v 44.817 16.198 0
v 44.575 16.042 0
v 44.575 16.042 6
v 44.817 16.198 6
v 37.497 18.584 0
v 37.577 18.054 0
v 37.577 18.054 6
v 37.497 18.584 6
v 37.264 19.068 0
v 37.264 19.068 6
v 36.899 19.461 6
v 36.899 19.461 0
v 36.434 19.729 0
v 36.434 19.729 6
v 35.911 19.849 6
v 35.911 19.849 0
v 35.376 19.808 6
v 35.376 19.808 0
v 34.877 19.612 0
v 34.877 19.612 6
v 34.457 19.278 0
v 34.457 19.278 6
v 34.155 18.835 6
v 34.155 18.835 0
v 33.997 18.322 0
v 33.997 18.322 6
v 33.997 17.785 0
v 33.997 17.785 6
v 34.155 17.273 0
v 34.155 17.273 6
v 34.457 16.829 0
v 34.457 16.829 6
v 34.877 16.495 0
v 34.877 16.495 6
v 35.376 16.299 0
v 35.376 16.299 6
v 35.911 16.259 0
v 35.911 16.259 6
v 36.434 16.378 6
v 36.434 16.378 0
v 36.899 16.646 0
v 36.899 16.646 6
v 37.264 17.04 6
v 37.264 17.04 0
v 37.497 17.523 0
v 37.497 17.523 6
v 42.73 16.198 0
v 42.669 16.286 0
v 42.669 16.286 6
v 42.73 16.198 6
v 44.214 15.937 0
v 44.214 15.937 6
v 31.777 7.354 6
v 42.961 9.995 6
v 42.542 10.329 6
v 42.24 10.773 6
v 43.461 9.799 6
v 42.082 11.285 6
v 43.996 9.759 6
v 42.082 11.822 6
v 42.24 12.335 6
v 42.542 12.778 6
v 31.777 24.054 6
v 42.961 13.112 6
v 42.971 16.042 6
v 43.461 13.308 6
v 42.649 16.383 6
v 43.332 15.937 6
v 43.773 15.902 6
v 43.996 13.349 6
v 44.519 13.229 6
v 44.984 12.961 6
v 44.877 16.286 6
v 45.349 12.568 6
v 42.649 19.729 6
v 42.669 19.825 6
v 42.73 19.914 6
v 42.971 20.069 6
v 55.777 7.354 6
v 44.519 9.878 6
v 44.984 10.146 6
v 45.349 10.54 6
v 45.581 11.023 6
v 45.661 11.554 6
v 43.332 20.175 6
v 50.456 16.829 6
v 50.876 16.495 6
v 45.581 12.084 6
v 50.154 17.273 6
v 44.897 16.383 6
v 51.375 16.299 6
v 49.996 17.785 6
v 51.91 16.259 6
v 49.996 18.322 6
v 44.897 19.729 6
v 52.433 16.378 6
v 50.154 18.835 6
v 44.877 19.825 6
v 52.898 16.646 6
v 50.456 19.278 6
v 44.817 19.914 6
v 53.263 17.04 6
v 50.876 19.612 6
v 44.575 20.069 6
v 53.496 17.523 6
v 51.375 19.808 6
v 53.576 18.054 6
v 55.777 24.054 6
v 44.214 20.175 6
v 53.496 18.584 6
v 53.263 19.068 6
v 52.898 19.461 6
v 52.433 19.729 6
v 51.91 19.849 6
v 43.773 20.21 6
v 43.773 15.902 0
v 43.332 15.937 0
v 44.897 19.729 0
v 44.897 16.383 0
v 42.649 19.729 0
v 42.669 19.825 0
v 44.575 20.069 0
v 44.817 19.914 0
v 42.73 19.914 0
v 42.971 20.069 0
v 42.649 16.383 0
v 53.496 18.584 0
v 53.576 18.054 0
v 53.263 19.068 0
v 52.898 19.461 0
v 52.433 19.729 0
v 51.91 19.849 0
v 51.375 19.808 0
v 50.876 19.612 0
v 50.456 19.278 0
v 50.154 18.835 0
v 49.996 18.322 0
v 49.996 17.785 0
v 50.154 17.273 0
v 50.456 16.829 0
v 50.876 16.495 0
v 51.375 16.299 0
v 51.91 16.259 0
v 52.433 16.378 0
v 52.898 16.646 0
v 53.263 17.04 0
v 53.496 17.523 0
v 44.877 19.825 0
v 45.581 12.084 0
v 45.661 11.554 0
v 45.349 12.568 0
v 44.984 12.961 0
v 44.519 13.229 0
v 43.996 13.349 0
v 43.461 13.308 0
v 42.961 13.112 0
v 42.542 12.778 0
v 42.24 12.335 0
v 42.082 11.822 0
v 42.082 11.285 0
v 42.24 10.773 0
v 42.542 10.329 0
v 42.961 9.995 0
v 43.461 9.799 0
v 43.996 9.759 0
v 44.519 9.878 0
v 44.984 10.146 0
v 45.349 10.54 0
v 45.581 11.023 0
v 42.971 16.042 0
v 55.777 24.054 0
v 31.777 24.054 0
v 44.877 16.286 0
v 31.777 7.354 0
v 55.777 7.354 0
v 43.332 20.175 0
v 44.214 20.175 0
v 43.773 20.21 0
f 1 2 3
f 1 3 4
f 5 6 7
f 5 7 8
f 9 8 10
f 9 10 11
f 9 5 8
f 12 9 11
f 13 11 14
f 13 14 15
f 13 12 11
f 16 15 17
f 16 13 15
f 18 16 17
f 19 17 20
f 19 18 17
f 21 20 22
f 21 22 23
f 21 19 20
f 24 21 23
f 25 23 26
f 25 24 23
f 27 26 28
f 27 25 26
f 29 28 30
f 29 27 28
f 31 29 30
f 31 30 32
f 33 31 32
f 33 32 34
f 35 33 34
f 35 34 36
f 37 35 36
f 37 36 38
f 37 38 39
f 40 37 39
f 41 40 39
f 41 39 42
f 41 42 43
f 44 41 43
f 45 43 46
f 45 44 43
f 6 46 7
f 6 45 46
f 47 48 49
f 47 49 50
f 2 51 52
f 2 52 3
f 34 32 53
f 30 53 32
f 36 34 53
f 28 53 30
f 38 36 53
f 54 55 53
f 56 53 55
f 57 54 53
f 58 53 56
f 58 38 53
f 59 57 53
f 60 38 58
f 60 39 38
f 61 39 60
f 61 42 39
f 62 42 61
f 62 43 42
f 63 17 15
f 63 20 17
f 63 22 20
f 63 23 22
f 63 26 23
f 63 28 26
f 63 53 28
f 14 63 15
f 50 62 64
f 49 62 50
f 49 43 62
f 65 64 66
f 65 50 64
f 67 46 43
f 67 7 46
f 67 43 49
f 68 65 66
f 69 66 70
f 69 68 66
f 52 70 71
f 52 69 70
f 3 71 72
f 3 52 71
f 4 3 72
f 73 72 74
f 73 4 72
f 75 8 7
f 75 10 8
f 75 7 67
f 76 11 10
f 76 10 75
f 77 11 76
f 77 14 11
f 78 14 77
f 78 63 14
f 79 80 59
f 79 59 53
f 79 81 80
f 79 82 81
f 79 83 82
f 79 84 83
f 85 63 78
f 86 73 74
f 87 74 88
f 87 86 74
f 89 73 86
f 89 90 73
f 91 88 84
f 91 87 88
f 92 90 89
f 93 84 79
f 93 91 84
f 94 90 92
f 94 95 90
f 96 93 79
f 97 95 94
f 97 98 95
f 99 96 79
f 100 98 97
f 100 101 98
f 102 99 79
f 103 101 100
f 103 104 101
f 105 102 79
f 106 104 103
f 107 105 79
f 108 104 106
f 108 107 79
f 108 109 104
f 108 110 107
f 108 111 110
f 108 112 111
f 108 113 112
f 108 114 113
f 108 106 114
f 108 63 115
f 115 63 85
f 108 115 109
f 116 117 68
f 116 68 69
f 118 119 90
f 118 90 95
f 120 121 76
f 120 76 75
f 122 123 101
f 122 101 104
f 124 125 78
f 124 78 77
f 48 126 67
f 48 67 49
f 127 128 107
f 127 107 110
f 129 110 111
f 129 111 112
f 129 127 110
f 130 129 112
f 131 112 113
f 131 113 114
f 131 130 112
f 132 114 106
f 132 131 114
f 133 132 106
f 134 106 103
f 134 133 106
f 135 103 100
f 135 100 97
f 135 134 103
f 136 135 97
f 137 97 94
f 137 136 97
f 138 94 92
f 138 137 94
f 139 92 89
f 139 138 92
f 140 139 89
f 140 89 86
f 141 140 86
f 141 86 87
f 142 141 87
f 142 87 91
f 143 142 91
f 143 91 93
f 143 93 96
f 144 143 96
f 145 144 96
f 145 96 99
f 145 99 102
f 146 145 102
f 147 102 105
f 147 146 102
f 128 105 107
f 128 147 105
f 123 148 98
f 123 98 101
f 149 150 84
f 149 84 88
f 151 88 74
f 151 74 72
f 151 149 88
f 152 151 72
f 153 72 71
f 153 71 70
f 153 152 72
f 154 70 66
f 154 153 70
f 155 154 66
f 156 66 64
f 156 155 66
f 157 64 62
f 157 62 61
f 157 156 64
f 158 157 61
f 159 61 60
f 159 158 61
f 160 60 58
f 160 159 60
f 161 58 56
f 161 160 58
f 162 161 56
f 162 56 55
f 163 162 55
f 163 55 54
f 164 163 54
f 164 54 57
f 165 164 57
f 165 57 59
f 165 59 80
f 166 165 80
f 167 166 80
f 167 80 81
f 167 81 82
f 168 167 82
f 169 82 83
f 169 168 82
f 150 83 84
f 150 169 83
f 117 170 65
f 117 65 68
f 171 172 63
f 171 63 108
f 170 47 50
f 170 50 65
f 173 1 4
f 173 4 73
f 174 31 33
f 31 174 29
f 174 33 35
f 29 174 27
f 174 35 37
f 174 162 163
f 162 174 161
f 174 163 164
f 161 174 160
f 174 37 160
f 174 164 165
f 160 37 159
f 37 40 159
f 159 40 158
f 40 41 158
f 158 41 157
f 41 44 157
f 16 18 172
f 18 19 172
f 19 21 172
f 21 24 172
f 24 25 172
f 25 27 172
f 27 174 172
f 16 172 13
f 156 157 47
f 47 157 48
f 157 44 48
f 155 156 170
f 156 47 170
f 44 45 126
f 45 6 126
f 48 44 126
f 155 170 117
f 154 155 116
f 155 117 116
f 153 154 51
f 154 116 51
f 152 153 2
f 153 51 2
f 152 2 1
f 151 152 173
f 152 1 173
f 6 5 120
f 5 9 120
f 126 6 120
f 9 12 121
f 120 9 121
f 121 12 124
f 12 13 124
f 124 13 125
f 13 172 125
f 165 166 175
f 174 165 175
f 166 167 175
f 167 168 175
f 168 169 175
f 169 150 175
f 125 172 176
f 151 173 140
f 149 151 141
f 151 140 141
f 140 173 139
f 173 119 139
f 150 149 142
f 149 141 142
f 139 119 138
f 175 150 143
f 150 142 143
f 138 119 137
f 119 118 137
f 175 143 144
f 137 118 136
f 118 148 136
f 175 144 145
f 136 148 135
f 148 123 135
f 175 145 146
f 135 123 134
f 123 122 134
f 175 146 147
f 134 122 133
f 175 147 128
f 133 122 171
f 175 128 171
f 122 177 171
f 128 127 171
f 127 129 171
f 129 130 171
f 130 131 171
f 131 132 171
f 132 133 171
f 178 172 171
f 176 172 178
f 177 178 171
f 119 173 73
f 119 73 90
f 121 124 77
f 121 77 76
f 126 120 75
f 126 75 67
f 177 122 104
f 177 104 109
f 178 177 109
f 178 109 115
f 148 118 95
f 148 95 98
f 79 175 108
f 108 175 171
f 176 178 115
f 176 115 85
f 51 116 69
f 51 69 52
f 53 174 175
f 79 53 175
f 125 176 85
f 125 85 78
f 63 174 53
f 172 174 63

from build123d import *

# Parameters (mm, degrees)
MODEL_W                  = 23.99999232
MODEL_H                  = 16.699994656
MODEL_R                  = 1.8
RESSALTO_EXTRUS_O1_DEPTH = 6


with BuildPart() as part:
    # Model → Ressalto-extrusão1 (new body)
    with BuildSketch(Plane.XY):
        with Locations((43.7766695, 15.703554206)):
            Rectangle(MODEL_W, MODEL_H)
        with Locations((35.77667206, 18.053553454)):
            Circle(MODEL_R, mode=Mode.SUBTRACT)
        with Locations((43.861433665, 11.553555534)):
            Circle(MODEL_R, mode=Mode.SUBTRACT)
        with Locations((51.77555053, 18.053553454)):
            Circle(MODEL_R, mode=Mode.SUBTRACT)
        Polygon((42.649145536, 19.728924359), (42.649145536, 16.382506676), (42.669242478, 16.286318247), (42.729533303, 16.197543356), (42.970696603, 16.042234191), (43.332060456, 15.936872625), (43.77304988, 15.901752102), (44.214039305, 15.936872625), (44.575403158, 16.042234191), (44.816566458, 16.197543356), (44.876857283, 16.286318247), (44.896954225, 16.382506676), (44.896954225, 19.728924359), (44.876857283, 19.825112787), (44.816566458, 19.913887678), (44.575403158, 20.069196843), (44.214039305, 20.17455841), (43.77304988, 20.209678932), (43.332060456, 20.17455841), (42.970696603, 20.069196843), (42.729533303, 19.913887678), (42.669242478, 19.825112787), align=None, mode=Mode.SUBTRACT)
    extrude(amount=RESSALTO_EXTRUS_O1_DEPTH)


solid = part.part
